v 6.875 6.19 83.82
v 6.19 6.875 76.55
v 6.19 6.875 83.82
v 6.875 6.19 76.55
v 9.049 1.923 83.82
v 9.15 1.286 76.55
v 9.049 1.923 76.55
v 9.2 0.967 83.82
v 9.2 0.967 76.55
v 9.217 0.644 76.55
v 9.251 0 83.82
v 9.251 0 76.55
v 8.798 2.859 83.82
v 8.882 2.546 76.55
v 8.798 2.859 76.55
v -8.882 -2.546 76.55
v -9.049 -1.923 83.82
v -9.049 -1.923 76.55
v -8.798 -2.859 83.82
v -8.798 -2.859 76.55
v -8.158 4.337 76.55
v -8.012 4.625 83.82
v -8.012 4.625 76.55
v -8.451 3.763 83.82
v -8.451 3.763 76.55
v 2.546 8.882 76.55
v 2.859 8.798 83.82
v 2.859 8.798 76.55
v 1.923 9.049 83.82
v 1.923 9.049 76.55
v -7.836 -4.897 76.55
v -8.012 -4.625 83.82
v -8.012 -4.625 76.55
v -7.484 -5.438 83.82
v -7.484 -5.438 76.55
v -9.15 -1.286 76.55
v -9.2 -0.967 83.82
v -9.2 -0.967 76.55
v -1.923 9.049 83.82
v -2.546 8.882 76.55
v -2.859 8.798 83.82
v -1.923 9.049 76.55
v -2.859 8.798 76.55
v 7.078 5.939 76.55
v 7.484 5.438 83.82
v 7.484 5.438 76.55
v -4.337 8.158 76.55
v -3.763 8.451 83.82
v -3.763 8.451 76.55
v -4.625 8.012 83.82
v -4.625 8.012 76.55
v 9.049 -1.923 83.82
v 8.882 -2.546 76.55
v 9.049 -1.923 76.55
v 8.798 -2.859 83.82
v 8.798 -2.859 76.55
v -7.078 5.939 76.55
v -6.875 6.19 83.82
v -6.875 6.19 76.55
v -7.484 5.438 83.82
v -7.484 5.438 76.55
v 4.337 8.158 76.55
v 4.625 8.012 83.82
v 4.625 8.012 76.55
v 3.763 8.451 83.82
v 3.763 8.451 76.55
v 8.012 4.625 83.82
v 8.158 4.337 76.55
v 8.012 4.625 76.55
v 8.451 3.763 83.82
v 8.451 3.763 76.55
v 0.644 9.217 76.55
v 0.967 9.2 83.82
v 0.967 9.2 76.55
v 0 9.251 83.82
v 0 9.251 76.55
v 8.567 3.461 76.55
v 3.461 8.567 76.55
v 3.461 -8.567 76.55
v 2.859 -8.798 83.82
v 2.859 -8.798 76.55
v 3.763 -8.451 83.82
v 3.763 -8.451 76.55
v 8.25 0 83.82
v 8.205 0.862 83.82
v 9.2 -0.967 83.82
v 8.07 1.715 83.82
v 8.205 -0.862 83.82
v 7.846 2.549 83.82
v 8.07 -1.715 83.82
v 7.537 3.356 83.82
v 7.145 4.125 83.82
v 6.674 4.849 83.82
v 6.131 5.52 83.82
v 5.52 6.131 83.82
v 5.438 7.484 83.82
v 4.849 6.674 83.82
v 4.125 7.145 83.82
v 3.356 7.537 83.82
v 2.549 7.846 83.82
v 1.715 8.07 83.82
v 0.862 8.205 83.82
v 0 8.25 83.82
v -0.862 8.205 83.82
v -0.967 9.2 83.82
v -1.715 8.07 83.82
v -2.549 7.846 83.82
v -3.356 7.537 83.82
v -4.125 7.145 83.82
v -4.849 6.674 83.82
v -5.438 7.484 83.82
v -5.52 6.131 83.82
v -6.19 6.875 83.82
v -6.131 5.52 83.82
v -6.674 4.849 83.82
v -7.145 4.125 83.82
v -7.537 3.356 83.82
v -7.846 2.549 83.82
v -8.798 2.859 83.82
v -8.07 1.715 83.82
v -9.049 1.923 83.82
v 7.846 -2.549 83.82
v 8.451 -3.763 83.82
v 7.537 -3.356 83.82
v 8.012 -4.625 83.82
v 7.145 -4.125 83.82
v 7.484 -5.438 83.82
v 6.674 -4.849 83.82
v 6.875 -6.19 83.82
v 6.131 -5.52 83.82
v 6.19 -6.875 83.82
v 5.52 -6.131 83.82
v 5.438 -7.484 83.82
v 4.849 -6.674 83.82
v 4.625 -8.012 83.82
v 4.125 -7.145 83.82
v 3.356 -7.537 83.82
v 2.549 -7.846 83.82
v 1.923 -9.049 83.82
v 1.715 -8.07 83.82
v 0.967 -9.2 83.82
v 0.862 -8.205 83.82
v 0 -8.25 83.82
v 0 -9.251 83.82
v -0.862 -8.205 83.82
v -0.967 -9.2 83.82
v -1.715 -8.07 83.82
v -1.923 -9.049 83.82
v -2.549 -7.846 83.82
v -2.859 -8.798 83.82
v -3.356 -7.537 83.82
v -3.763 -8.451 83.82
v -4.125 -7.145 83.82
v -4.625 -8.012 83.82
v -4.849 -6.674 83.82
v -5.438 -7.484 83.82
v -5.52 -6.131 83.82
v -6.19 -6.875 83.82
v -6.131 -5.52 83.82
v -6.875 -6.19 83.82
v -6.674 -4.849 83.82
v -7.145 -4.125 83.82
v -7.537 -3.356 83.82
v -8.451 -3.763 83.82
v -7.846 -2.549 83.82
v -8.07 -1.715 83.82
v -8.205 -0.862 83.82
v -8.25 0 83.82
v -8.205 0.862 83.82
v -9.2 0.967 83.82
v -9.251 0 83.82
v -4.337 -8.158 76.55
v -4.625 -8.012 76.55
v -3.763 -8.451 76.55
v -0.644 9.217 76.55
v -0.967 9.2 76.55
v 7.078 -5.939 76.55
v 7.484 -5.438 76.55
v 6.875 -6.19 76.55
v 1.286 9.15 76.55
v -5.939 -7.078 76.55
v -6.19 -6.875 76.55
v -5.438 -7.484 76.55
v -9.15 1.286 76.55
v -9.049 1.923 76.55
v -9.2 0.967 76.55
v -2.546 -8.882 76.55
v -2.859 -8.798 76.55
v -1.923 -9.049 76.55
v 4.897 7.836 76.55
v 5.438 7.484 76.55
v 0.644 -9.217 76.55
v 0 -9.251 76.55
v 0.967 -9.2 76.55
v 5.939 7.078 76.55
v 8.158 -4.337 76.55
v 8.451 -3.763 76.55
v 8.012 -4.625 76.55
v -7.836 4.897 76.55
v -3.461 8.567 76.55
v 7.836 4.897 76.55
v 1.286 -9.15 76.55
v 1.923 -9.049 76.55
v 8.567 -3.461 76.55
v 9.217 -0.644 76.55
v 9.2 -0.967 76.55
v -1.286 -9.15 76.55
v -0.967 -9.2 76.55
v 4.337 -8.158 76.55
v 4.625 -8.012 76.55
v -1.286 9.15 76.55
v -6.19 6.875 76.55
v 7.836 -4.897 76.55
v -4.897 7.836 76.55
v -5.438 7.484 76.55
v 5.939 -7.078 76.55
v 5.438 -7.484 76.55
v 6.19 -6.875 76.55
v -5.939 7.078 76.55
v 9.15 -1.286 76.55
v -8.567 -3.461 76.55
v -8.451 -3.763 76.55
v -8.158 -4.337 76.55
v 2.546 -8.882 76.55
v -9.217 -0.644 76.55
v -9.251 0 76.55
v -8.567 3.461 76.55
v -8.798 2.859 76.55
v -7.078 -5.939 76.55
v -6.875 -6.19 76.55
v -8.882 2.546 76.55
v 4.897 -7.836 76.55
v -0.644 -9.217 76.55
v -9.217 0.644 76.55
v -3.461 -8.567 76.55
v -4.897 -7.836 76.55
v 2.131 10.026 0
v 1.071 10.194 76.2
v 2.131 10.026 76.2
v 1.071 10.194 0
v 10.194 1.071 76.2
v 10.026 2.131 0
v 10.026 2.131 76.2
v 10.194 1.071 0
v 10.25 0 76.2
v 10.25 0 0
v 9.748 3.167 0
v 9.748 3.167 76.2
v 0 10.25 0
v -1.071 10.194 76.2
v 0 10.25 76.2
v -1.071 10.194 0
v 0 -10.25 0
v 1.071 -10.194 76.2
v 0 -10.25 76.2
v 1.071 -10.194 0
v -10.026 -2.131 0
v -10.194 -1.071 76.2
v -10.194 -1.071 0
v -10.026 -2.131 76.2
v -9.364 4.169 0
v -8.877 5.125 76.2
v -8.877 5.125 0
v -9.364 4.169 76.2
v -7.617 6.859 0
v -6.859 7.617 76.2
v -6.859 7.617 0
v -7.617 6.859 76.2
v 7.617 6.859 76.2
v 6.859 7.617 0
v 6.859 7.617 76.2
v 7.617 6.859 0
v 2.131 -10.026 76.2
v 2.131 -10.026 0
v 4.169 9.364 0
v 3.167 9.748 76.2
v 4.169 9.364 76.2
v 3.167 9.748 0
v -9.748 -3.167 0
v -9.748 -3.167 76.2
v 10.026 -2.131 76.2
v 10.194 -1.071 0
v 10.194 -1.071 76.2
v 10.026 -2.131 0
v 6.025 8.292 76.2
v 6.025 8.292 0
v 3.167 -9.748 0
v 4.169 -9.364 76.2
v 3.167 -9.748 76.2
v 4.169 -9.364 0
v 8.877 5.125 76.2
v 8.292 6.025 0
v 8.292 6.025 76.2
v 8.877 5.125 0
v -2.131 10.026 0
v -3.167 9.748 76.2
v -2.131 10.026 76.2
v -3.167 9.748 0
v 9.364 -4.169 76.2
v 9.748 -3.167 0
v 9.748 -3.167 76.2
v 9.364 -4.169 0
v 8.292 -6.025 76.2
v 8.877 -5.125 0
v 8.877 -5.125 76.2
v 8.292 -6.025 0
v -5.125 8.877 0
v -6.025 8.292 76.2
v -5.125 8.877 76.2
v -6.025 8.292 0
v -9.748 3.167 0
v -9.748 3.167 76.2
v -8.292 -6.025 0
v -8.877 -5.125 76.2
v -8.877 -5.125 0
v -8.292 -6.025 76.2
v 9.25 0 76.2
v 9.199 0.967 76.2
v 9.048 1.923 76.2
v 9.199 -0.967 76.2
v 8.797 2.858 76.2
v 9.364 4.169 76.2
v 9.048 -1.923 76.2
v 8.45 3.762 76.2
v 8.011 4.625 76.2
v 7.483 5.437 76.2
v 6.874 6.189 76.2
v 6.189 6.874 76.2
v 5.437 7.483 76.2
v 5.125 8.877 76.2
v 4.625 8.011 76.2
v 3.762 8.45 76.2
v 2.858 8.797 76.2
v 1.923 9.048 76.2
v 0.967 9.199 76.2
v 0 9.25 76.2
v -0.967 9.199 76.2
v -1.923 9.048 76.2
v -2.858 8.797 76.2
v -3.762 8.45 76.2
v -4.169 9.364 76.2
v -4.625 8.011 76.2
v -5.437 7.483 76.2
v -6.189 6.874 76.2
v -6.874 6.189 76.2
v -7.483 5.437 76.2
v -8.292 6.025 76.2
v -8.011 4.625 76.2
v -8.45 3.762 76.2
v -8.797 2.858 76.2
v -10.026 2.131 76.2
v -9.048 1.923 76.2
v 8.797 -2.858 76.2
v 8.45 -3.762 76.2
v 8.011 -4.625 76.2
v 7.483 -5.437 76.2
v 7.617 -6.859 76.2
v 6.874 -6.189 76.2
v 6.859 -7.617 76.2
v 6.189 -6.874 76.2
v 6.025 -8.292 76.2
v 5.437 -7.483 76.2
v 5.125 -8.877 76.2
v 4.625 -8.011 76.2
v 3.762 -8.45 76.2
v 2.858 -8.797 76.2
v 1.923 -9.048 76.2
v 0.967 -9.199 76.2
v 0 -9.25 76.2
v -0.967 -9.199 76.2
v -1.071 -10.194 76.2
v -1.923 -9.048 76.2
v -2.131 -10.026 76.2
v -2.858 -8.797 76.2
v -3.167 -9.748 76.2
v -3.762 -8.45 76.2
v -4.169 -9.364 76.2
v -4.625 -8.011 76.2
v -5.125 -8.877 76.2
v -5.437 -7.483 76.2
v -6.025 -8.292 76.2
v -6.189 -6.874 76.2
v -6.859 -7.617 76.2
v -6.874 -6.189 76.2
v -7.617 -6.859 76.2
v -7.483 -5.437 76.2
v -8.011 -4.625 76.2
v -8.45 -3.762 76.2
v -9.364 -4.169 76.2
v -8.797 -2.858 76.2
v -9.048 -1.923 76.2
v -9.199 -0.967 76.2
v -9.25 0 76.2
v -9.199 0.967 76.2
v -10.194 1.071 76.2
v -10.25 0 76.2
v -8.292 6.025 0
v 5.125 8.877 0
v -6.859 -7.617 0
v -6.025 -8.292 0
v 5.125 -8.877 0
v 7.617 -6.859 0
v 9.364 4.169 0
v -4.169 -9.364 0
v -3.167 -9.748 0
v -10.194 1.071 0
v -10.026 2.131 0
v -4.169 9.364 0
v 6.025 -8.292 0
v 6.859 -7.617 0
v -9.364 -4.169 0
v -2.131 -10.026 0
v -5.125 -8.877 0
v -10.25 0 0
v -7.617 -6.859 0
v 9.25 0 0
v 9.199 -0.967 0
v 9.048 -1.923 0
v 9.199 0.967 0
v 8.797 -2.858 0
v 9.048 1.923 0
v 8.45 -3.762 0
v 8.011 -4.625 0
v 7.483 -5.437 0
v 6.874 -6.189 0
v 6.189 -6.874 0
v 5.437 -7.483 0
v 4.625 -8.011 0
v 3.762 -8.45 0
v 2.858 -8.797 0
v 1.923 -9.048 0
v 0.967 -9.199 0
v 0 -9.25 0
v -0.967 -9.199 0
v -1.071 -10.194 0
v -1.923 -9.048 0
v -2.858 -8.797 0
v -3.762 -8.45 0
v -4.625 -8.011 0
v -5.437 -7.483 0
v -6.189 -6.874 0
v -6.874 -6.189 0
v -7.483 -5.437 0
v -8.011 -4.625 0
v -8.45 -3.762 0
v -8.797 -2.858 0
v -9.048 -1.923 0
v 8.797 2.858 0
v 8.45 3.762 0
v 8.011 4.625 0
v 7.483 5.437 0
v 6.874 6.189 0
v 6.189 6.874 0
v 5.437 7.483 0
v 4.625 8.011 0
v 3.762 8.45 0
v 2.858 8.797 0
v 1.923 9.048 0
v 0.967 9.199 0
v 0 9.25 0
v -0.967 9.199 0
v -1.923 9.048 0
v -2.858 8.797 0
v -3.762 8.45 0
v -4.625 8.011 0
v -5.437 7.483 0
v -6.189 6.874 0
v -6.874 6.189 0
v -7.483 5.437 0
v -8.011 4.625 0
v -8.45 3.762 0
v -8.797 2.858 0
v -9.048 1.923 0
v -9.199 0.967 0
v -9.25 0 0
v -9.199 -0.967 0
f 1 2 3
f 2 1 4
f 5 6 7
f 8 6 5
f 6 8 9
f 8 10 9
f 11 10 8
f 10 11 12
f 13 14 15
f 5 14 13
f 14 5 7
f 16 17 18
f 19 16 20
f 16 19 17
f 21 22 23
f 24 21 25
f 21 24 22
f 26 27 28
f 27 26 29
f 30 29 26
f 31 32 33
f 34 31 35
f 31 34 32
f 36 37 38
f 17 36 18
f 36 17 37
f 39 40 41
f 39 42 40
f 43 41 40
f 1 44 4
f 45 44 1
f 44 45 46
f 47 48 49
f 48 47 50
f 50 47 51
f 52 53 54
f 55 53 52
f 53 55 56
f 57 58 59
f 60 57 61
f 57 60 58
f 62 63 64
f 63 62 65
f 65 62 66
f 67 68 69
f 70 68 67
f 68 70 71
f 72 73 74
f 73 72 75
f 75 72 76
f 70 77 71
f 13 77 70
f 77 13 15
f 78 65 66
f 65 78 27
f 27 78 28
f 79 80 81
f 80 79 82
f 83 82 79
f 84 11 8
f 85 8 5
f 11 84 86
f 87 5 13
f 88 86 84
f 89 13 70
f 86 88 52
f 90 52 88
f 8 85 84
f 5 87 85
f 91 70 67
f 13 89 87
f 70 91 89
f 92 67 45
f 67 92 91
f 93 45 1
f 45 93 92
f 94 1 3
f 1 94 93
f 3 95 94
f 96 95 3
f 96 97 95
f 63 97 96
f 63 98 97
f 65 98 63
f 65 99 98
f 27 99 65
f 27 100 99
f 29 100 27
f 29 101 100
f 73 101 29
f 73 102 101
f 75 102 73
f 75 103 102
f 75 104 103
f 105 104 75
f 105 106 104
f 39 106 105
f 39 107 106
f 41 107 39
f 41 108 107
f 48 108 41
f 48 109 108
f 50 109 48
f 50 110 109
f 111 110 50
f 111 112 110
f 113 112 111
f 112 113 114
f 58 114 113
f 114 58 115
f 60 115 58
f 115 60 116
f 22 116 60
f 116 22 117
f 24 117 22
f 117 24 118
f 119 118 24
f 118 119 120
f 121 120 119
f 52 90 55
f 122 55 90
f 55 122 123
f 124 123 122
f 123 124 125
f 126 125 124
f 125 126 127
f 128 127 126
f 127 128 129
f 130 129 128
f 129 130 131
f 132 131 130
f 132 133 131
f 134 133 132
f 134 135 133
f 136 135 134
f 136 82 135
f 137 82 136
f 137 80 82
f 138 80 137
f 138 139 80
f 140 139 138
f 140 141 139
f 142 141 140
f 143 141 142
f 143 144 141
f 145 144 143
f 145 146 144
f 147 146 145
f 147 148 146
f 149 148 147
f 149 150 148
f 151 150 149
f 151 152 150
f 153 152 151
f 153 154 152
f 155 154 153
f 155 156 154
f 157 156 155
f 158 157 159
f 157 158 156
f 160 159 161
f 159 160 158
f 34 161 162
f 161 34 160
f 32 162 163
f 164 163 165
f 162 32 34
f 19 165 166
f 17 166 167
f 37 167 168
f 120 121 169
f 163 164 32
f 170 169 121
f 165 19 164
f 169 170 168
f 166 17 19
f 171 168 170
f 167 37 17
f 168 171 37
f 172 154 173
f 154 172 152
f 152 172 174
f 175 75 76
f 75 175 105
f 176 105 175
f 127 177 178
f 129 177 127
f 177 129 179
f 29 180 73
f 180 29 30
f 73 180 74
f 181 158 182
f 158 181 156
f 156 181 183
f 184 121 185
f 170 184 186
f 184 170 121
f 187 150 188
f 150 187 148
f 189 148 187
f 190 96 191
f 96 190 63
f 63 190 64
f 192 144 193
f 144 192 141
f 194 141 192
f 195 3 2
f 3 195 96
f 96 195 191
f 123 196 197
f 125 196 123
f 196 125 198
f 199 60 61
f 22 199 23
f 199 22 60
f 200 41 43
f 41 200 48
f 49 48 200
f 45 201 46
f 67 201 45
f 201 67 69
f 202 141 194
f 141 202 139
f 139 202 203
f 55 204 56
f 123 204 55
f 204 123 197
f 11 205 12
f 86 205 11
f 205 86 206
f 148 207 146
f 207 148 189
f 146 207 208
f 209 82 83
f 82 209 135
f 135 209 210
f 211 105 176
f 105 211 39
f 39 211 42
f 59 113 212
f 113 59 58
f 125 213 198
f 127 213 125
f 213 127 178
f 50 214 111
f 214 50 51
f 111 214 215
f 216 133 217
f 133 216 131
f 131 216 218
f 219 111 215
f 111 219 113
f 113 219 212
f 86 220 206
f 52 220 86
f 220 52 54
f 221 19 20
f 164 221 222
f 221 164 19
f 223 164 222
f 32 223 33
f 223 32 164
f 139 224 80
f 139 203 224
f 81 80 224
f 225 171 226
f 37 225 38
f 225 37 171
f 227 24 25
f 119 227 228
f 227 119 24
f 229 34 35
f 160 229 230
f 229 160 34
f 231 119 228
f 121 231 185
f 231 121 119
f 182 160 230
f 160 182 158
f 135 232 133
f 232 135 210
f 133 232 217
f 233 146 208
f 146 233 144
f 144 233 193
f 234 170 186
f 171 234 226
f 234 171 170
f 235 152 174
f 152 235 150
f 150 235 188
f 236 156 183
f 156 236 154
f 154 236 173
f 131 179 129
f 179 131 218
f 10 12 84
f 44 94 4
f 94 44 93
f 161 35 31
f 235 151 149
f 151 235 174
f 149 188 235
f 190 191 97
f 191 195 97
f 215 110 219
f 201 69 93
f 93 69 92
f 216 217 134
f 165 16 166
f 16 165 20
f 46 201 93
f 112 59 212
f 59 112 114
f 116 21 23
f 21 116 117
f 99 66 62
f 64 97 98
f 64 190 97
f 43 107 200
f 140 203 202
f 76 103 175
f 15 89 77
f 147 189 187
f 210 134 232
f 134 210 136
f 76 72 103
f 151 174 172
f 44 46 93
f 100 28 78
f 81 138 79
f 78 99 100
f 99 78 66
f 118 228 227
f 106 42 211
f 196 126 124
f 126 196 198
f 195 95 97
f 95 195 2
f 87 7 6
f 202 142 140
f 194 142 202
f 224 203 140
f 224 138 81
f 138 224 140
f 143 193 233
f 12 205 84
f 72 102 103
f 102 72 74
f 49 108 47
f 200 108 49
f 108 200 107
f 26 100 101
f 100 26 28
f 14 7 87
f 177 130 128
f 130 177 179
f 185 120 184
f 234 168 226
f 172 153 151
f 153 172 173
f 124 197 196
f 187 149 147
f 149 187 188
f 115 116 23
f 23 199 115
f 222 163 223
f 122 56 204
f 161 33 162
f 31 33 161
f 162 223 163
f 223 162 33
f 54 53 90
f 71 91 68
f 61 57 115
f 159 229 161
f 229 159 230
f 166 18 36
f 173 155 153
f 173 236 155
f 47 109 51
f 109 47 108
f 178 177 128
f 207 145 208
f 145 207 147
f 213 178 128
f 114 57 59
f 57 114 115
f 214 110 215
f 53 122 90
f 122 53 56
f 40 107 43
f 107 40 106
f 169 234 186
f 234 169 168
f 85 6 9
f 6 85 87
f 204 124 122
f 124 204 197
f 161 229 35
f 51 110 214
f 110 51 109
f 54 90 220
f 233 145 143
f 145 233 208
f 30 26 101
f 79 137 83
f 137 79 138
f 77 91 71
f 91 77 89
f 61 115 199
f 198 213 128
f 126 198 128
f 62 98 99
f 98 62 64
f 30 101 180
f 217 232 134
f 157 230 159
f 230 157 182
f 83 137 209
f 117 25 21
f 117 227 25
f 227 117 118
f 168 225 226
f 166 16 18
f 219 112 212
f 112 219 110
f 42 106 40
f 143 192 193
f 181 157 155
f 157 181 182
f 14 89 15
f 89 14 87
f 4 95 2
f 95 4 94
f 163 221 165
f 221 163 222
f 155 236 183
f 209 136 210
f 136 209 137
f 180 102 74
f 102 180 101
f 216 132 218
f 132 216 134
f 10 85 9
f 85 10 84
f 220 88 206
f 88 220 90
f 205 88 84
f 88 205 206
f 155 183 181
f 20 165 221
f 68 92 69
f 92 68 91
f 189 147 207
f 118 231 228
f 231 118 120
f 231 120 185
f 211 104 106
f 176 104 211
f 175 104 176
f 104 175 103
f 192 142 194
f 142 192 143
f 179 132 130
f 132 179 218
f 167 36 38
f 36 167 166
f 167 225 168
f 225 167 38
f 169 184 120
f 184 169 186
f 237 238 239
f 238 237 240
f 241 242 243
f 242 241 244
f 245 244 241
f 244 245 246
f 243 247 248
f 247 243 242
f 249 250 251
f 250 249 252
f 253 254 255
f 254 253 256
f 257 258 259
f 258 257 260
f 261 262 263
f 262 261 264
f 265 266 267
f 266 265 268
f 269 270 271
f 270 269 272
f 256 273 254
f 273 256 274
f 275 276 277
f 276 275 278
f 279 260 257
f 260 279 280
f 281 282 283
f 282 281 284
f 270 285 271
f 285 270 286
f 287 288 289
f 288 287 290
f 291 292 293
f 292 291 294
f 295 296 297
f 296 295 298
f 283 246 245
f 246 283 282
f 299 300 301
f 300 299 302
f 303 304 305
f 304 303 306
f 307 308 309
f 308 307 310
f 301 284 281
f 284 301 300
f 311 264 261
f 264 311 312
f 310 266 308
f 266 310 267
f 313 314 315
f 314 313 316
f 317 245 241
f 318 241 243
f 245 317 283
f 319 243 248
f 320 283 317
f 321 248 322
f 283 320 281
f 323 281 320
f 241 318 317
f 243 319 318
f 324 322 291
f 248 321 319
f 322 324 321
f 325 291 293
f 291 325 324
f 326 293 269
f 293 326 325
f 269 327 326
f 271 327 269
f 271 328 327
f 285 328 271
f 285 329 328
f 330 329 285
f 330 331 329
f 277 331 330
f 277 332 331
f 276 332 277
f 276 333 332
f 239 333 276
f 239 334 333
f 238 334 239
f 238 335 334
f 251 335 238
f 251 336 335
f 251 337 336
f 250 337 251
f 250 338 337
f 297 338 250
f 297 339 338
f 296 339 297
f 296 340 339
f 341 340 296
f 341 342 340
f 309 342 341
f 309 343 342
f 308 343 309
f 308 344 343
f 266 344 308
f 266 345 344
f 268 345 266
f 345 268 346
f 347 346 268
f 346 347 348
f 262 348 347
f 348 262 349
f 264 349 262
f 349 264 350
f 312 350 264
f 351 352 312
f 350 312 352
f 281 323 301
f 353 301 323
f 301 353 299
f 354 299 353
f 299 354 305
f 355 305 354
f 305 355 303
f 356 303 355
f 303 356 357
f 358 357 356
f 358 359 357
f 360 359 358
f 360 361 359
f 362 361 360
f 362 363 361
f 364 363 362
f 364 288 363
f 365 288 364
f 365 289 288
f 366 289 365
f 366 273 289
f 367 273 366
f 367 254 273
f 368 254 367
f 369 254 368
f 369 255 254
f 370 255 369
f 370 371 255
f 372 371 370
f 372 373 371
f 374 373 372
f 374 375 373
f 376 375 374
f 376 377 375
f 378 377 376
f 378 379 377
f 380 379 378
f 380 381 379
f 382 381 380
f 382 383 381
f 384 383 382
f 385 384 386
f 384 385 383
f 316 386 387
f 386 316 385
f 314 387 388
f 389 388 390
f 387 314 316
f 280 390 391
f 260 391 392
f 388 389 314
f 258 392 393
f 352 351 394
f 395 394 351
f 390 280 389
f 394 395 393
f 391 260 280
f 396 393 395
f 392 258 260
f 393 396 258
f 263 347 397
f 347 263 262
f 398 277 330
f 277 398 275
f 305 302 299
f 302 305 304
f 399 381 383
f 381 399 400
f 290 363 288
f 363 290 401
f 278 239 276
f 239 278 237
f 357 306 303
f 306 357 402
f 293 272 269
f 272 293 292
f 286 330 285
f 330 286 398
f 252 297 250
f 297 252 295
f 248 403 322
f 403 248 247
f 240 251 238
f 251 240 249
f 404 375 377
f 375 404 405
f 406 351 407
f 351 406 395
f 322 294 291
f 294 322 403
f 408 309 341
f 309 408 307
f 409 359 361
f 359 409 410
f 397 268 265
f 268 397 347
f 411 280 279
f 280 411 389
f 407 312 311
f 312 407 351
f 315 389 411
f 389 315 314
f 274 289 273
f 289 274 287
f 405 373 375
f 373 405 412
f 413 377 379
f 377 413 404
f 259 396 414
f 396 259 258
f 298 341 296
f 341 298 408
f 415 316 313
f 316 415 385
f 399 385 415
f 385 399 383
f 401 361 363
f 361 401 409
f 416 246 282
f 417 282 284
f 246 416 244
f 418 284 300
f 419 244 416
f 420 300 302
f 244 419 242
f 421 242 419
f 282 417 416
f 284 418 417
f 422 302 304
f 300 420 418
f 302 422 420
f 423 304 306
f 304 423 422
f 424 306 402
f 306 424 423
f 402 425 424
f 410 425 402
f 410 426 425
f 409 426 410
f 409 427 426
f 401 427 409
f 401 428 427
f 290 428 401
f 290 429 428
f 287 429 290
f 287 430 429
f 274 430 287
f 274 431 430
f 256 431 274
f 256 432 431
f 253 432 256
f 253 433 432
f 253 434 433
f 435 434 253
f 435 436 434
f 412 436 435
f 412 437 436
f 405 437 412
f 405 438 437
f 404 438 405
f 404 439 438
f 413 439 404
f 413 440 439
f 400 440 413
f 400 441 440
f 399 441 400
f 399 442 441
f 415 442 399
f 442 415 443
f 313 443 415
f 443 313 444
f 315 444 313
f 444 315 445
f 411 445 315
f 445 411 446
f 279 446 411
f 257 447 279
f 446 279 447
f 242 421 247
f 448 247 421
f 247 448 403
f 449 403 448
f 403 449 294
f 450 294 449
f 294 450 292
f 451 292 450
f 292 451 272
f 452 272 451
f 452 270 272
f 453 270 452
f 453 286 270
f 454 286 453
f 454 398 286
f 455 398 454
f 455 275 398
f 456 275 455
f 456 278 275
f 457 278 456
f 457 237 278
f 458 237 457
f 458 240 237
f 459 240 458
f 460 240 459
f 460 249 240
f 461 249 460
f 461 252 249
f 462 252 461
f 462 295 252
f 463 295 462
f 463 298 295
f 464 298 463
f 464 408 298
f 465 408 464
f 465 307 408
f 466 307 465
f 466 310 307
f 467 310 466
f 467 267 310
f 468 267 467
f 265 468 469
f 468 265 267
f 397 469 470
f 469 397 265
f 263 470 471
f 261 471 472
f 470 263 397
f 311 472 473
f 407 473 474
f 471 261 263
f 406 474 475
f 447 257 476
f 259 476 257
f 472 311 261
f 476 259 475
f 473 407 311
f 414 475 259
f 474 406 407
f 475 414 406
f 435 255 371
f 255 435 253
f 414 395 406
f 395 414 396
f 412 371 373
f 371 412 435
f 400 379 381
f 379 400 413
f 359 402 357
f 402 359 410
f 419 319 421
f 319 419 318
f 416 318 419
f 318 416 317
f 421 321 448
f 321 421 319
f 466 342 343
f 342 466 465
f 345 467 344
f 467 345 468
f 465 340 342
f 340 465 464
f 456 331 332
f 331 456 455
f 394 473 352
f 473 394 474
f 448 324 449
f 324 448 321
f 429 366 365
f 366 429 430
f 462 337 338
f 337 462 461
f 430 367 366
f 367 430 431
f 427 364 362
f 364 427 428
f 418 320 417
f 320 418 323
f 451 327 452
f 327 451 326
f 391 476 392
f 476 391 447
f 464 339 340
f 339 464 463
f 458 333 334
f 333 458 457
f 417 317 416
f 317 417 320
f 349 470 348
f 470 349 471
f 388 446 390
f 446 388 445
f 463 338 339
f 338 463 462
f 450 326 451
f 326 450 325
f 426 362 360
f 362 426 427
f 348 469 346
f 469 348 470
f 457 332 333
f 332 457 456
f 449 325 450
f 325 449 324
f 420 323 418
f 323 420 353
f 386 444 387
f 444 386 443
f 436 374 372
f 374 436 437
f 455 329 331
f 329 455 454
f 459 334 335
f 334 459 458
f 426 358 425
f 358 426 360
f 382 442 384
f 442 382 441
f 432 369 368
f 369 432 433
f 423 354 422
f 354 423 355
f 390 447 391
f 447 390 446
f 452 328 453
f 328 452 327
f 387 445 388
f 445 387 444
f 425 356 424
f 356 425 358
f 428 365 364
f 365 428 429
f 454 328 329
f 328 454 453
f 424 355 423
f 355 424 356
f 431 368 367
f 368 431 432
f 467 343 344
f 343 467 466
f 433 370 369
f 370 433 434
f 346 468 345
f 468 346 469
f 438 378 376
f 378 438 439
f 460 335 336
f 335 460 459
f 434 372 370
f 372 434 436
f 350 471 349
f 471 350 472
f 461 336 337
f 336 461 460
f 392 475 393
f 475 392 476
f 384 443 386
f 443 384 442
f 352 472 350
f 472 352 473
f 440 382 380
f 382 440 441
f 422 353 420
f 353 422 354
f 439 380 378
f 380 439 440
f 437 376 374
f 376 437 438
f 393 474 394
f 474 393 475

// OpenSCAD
fins = 4;
fin_span = 80;
fin_thickness = 1.5;
fin_endchord = 30;

base_height = 76.2;     // 3 inches
collar_height = 7.62;   // .3 inches

wall_thickness = 2;
collar_overlap = 4;
//collar_outer_dia = 17.78;
collar_outer_dia = 18.5;
collar_inner_dia = collar_outer_dia - wall_thickness;

base_inner_dia = collar_outer_dia;
base_outer_dia = base_inner_dia + wall_thickness;

guide_inner_dia = 4.6;
guide_outer_dia = guide_inner_dia + 1;

difference()
{
    union()
    {
        // intial body
		cylinder(h=base_height, r=base_outer_dia / 2, $fn=60);
        // collar
        translate([0, 0, base_height - collar_overlap]) 
            difference()
            {
                cylinder(h=collar_height + collar_overlap, r=collar_outer_dia / 2 + .001, $fn=60);
                cylinder(h=collar_height + collar_overlap, r2=collar_inner_dia / 2, r1=collar_outer_dia / 2 + .6 , $fn=60);
            }
    }
    // inner (subtractive) cynlinder
    cylinder(h=base_height, r=base_inner_dia / 2, $fn=60);
}
